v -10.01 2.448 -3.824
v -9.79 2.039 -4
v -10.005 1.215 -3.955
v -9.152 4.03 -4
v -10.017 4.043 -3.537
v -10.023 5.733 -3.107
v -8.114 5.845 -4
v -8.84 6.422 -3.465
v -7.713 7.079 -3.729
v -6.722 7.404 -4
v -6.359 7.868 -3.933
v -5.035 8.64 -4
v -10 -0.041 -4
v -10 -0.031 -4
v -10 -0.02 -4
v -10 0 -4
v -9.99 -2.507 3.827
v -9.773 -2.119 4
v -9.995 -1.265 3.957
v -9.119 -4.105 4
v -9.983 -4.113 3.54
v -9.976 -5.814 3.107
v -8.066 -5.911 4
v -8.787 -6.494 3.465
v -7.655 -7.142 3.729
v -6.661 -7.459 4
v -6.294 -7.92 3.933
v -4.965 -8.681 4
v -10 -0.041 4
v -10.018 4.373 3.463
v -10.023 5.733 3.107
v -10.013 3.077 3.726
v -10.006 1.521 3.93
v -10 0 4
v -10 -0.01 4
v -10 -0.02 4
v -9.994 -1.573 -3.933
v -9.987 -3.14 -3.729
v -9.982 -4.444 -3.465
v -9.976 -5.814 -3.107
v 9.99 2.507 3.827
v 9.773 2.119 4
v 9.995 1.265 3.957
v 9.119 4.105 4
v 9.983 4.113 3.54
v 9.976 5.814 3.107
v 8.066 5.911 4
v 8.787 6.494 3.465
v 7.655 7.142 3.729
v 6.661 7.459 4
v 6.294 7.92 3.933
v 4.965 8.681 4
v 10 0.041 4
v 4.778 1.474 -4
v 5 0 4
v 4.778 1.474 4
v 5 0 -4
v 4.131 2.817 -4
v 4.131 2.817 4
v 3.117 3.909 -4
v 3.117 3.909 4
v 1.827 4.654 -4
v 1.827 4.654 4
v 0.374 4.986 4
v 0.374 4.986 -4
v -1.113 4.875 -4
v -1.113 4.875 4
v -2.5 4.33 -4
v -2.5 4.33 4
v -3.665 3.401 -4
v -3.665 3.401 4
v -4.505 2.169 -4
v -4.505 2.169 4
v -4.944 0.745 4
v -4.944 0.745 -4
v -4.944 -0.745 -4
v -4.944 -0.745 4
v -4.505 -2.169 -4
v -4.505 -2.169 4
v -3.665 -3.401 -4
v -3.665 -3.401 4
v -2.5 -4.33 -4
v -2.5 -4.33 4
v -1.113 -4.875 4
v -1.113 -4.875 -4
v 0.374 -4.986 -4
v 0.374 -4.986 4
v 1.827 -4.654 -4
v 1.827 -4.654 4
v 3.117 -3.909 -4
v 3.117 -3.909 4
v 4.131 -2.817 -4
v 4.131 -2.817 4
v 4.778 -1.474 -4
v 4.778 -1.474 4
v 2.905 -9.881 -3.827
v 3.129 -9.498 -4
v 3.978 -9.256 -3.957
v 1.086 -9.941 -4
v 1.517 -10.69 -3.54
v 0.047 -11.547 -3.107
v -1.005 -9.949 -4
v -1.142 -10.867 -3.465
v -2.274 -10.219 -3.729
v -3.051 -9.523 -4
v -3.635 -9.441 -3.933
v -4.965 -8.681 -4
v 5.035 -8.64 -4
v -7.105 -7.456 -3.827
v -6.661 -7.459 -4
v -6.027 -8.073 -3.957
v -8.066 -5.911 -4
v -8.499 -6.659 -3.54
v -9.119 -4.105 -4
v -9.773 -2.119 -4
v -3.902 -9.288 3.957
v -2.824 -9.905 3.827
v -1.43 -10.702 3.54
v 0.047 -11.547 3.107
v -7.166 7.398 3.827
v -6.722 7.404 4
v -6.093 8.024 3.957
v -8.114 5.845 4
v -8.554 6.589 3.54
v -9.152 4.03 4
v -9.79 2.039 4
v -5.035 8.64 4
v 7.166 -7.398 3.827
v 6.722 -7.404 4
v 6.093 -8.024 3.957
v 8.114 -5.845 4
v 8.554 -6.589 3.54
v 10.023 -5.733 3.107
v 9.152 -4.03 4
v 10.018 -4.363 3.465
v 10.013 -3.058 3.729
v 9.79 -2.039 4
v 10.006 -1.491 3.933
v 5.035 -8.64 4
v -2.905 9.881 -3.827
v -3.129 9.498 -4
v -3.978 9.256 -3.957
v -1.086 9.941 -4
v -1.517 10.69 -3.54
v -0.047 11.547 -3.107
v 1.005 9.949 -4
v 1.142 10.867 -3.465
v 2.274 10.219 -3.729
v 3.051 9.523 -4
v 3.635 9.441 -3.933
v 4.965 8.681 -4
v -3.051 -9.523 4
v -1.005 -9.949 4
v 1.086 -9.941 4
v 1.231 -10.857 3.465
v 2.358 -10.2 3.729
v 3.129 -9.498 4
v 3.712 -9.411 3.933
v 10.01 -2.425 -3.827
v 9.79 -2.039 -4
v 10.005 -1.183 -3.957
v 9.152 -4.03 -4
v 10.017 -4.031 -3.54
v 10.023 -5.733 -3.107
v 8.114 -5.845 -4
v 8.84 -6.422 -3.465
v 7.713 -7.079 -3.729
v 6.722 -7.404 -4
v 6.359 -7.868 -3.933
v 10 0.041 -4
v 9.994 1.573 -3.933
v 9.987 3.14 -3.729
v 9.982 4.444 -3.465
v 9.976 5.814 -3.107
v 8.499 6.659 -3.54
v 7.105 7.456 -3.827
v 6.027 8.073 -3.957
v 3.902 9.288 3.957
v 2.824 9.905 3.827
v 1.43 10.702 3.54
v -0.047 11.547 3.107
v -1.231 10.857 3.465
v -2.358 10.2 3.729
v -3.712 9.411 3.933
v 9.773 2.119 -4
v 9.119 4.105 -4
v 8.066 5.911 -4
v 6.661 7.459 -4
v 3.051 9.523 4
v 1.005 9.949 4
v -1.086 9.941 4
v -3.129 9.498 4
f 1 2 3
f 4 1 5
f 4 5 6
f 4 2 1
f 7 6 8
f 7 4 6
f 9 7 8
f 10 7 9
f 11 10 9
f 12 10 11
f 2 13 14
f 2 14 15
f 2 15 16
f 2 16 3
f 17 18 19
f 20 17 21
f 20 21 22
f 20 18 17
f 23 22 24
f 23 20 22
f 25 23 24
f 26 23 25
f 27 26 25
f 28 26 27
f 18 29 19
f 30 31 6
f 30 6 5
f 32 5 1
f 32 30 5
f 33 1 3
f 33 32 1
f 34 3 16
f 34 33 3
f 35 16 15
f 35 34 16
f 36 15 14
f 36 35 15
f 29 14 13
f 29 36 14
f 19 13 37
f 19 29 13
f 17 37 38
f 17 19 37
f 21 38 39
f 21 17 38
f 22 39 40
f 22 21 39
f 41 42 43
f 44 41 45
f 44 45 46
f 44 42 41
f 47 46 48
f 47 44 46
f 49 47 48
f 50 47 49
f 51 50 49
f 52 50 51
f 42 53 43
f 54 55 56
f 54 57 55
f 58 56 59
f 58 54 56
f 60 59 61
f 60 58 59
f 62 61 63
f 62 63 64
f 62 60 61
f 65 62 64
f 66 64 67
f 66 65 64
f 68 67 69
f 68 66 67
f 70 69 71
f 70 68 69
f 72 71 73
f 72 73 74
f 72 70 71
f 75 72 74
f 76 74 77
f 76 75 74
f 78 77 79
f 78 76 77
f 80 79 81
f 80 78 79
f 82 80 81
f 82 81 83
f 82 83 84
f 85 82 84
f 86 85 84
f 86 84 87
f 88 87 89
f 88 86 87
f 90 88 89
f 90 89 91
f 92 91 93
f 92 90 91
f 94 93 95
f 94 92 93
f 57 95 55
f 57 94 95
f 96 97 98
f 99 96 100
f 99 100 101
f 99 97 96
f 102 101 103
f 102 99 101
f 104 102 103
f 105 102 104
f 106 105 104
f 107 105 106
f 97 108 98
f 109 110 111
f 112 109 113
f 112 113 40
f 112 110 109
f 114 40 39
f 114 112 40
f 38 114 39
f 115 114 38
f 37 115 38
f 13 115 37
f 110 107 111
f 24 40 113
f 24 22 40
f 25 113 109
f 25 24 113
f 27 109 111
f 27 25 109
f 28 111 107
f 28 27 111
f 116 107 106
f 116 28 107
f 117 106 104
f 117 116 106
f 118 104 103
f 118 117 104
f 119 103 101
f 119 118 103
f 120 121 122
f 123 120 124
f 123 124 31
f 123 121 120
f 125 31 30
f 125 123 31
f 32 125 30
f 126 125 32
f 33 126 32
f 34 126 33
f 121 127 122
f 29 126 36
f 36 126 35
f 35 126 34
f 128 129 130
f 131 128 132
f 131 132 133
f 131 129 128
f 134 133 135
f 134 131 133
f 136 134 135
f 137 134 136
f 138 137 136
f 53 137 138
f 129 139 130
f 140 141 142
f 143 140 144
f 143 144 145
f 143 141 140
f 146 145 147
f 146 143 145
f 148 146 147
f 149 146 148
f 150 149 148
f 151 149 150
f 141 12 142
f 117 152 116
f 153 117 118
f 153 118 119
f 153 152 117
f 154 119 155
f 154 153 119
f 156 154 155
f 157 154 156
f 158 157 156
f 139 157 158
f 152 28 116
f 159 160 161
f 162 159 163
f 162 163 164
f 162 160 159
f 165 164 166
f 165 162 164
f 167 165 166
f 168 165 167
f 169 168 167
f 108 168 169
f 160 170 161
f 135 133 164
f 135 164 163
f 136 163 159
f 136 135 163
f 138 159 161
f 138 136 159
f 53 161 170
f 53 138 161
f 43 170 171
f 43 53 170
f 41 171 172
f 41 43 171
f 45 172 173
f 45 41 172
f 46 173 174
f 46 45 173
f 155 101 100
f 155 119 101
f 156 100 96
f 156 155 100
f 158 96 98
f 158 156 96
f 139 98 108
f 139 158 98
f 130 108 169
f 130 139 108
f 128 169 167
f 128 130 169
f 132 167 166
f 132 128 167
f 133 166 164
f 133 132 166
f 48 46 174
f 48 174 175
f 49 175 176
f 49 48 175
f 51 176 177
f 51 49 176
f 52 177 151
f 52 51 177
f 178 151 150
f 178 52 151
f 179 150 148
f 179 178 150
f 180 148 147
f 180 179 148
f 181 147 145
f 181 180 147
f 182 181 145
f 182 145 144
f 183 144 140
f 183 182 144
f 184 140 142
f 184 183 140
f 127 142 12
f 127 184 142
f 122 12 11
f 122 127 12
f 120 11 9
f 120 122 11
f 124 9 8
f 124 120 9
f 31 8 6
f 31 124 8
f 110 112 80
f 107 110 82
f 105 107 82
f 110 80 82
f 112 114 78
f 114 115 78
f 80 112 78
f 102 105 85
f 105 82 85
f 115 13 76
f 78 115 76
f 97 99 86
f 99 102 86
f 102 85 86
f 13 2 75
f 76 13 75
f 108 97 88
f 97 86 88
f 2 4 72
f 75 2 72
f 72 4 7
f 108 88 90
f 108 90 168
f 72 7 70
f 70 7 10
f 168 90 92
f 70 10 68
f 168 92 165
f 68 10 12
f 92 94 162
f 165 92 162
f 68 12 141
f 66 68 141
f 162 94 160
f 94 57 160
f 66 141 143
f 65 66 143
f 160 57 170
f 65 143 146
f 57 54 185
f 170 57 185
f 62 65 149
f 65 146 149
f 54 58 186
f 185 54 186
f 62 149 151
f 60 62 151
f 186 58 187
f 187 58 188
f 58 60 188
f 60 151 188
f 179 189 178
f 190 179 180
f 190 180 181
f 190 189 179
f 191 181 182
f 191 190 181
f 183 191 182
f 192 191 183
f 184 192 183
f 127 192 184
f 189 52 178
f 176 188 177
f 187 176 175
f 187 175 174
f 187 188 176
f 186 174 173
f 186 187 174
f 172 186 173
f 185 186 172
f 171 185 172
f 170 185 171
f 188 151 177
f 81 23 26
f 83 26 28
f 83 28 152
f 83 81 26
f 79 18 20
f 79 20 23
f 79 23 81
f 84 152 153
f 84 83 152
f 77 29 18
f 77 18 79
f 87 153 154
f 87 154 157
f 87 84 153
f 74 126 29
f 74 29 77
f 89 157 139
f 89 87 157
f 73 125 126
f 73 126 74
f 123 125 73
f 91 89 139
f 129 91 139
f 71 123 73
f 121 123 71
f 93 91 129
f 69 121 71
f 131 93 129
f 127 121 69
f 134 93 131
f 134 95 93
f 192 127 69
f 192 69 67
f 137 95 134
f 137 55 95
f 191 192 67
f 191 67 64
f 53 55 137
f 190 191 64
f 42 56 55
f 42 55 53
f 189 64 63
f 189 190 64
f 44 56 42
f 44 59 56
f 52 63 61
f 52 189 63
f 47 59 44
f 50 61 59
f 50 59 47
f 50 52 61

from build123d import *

# Parameters (mm, degrees)
SKETCH1_R               = 5
BOSS_EXTRUDE1_DEPTH     = 4
SKETCH2_OUTSIDE_W       = 56.08
SKETCH2_OUTSIDE_H       = 59.128
SKETCH2_OUTSIDE_R       = 10
CUT_EXTRUDE1_DEPTH      = 8
CUT_EXTRUDE1_DRAFT      = -60
MIRROR1_COPY_1_SKETCH_W = 56.08
MIRROR1_COPY_1_SKETCH_H = 59.128
MIRROR1_COPY_1_SKETCH_R = 10
MIRROR1_COPY_1_DEPTH    = 8
MIRROR1_COPY_1_DRAFT    = -60


with BuildPart() as part:
    # Sketch1 → Boss-Extrude1 (new, symmetric)
    with BuildSketch(Plane.XY):
        Polygon((10.023495122, -5.732615361), (9.976338094, 5.81429373), (-0.047157028, 11.546909091), (-10.023495122, 5.732615361), (-9.976338094, -5.81429373), (0.047157028, -11.546909091), align=None)
        Circle(SKETCH1_R, mode=Mode.SUBTRACT)
    extrude(amount=BOSS_EXTRUDE1_DEPTH, both=True)


with BuildPart() as cut_extrude1_tool:
    # Sketch2 outside → Cut-Extrude1 (with draft: the straight prism first)
    with BuildSketch(Plane(origin=(0, 0, -4), x_dir=(-1, 0, 0), z_dir=(0, 0, -1))):
        Rectangle(SKETCH2_OUTSIDE_W, SKETCH2_OUTSIDE_H)
        Circle(SKETCH2_OUTSIDE_R, mode=Mode.SUBTRACT)
    extrude(amount=-CUT_EXTRUDE1_DEPTH)
    # Cut-Extrude1: the draft: its side faces are tilted about the plane it starts from
    cut_extrude1_sides = [cut_extrude1_tool.faces().sort_by_distance(p)[0] for p in [
        (0, -29.564, 0),
        (-28.04, 0, 0),
        (0, 29.564, 0),
        (28.04, 0, 0),
        (10, 0, 0),
    ]]
    draft(cut_extrude1_sides, Plane(origin=(0, 0, -4), x_dir=(-1, 0, 0), z_dir=(0, 0, -1)), CUT_EXTRUDE1_DRAFT)


with BuildPart() as part_1:
    add(part.part)

    # Cut-Extrude1: cut by cut_extrude1_tool
    add(cut_extrude1_tool.part, mode=Mode.SUBTRACT)


with BuildPart() as mirror1_copy_1_tool:
    # Mirror1 copy 1 sketch → Mirror1 copy 1 (with draft: the straight prism first)
    with BuildSketch(Plane(origin=(0, 0, 4), x_dir=(-1, 0, 0), z_dir=(0, 0, 1))):
        Rectangle(MIRROR1_COPY_1_SKETCH_W, MIRROR1_COPY_1_SKETCH_H)
        Circle(MIRROR1_COPY_1_SKETCH_R, mode=Mode.SUBTRACT)
    extrude(amount=-MIRROR1_COPY_1_DEPTH)
    # Mirror1 copy 1: the draft: its side faces are tilted about the plane it starts from
    mirror1_copy_1_sides = [mirror1_copy_1_tool.faces().sort_by_distance(p)[0] for p in [
        (0, -29.564, 0),
        (-28.04, 0, 0),
        (0, 29.564, 0),
        (28.04, 0, 0),
        (10, 0, 0),
    ]]
    draft(mirror1_copy_1_sides, Plane(origin=(0, 0, 4), x_dir=(-1, 0, 0), z_dir=(0, 0, 1)), MIRROR1_COPY_1_DRAFT)


with BuildPart() as part_2:
    add(part_1.part)

    # Mirror1 copy 1: cut by mirror1_copy_1_tool
    add(mirror1_copy_1_tool.part, mode=Mode.SUBTRACT)


solid = part_2.part
